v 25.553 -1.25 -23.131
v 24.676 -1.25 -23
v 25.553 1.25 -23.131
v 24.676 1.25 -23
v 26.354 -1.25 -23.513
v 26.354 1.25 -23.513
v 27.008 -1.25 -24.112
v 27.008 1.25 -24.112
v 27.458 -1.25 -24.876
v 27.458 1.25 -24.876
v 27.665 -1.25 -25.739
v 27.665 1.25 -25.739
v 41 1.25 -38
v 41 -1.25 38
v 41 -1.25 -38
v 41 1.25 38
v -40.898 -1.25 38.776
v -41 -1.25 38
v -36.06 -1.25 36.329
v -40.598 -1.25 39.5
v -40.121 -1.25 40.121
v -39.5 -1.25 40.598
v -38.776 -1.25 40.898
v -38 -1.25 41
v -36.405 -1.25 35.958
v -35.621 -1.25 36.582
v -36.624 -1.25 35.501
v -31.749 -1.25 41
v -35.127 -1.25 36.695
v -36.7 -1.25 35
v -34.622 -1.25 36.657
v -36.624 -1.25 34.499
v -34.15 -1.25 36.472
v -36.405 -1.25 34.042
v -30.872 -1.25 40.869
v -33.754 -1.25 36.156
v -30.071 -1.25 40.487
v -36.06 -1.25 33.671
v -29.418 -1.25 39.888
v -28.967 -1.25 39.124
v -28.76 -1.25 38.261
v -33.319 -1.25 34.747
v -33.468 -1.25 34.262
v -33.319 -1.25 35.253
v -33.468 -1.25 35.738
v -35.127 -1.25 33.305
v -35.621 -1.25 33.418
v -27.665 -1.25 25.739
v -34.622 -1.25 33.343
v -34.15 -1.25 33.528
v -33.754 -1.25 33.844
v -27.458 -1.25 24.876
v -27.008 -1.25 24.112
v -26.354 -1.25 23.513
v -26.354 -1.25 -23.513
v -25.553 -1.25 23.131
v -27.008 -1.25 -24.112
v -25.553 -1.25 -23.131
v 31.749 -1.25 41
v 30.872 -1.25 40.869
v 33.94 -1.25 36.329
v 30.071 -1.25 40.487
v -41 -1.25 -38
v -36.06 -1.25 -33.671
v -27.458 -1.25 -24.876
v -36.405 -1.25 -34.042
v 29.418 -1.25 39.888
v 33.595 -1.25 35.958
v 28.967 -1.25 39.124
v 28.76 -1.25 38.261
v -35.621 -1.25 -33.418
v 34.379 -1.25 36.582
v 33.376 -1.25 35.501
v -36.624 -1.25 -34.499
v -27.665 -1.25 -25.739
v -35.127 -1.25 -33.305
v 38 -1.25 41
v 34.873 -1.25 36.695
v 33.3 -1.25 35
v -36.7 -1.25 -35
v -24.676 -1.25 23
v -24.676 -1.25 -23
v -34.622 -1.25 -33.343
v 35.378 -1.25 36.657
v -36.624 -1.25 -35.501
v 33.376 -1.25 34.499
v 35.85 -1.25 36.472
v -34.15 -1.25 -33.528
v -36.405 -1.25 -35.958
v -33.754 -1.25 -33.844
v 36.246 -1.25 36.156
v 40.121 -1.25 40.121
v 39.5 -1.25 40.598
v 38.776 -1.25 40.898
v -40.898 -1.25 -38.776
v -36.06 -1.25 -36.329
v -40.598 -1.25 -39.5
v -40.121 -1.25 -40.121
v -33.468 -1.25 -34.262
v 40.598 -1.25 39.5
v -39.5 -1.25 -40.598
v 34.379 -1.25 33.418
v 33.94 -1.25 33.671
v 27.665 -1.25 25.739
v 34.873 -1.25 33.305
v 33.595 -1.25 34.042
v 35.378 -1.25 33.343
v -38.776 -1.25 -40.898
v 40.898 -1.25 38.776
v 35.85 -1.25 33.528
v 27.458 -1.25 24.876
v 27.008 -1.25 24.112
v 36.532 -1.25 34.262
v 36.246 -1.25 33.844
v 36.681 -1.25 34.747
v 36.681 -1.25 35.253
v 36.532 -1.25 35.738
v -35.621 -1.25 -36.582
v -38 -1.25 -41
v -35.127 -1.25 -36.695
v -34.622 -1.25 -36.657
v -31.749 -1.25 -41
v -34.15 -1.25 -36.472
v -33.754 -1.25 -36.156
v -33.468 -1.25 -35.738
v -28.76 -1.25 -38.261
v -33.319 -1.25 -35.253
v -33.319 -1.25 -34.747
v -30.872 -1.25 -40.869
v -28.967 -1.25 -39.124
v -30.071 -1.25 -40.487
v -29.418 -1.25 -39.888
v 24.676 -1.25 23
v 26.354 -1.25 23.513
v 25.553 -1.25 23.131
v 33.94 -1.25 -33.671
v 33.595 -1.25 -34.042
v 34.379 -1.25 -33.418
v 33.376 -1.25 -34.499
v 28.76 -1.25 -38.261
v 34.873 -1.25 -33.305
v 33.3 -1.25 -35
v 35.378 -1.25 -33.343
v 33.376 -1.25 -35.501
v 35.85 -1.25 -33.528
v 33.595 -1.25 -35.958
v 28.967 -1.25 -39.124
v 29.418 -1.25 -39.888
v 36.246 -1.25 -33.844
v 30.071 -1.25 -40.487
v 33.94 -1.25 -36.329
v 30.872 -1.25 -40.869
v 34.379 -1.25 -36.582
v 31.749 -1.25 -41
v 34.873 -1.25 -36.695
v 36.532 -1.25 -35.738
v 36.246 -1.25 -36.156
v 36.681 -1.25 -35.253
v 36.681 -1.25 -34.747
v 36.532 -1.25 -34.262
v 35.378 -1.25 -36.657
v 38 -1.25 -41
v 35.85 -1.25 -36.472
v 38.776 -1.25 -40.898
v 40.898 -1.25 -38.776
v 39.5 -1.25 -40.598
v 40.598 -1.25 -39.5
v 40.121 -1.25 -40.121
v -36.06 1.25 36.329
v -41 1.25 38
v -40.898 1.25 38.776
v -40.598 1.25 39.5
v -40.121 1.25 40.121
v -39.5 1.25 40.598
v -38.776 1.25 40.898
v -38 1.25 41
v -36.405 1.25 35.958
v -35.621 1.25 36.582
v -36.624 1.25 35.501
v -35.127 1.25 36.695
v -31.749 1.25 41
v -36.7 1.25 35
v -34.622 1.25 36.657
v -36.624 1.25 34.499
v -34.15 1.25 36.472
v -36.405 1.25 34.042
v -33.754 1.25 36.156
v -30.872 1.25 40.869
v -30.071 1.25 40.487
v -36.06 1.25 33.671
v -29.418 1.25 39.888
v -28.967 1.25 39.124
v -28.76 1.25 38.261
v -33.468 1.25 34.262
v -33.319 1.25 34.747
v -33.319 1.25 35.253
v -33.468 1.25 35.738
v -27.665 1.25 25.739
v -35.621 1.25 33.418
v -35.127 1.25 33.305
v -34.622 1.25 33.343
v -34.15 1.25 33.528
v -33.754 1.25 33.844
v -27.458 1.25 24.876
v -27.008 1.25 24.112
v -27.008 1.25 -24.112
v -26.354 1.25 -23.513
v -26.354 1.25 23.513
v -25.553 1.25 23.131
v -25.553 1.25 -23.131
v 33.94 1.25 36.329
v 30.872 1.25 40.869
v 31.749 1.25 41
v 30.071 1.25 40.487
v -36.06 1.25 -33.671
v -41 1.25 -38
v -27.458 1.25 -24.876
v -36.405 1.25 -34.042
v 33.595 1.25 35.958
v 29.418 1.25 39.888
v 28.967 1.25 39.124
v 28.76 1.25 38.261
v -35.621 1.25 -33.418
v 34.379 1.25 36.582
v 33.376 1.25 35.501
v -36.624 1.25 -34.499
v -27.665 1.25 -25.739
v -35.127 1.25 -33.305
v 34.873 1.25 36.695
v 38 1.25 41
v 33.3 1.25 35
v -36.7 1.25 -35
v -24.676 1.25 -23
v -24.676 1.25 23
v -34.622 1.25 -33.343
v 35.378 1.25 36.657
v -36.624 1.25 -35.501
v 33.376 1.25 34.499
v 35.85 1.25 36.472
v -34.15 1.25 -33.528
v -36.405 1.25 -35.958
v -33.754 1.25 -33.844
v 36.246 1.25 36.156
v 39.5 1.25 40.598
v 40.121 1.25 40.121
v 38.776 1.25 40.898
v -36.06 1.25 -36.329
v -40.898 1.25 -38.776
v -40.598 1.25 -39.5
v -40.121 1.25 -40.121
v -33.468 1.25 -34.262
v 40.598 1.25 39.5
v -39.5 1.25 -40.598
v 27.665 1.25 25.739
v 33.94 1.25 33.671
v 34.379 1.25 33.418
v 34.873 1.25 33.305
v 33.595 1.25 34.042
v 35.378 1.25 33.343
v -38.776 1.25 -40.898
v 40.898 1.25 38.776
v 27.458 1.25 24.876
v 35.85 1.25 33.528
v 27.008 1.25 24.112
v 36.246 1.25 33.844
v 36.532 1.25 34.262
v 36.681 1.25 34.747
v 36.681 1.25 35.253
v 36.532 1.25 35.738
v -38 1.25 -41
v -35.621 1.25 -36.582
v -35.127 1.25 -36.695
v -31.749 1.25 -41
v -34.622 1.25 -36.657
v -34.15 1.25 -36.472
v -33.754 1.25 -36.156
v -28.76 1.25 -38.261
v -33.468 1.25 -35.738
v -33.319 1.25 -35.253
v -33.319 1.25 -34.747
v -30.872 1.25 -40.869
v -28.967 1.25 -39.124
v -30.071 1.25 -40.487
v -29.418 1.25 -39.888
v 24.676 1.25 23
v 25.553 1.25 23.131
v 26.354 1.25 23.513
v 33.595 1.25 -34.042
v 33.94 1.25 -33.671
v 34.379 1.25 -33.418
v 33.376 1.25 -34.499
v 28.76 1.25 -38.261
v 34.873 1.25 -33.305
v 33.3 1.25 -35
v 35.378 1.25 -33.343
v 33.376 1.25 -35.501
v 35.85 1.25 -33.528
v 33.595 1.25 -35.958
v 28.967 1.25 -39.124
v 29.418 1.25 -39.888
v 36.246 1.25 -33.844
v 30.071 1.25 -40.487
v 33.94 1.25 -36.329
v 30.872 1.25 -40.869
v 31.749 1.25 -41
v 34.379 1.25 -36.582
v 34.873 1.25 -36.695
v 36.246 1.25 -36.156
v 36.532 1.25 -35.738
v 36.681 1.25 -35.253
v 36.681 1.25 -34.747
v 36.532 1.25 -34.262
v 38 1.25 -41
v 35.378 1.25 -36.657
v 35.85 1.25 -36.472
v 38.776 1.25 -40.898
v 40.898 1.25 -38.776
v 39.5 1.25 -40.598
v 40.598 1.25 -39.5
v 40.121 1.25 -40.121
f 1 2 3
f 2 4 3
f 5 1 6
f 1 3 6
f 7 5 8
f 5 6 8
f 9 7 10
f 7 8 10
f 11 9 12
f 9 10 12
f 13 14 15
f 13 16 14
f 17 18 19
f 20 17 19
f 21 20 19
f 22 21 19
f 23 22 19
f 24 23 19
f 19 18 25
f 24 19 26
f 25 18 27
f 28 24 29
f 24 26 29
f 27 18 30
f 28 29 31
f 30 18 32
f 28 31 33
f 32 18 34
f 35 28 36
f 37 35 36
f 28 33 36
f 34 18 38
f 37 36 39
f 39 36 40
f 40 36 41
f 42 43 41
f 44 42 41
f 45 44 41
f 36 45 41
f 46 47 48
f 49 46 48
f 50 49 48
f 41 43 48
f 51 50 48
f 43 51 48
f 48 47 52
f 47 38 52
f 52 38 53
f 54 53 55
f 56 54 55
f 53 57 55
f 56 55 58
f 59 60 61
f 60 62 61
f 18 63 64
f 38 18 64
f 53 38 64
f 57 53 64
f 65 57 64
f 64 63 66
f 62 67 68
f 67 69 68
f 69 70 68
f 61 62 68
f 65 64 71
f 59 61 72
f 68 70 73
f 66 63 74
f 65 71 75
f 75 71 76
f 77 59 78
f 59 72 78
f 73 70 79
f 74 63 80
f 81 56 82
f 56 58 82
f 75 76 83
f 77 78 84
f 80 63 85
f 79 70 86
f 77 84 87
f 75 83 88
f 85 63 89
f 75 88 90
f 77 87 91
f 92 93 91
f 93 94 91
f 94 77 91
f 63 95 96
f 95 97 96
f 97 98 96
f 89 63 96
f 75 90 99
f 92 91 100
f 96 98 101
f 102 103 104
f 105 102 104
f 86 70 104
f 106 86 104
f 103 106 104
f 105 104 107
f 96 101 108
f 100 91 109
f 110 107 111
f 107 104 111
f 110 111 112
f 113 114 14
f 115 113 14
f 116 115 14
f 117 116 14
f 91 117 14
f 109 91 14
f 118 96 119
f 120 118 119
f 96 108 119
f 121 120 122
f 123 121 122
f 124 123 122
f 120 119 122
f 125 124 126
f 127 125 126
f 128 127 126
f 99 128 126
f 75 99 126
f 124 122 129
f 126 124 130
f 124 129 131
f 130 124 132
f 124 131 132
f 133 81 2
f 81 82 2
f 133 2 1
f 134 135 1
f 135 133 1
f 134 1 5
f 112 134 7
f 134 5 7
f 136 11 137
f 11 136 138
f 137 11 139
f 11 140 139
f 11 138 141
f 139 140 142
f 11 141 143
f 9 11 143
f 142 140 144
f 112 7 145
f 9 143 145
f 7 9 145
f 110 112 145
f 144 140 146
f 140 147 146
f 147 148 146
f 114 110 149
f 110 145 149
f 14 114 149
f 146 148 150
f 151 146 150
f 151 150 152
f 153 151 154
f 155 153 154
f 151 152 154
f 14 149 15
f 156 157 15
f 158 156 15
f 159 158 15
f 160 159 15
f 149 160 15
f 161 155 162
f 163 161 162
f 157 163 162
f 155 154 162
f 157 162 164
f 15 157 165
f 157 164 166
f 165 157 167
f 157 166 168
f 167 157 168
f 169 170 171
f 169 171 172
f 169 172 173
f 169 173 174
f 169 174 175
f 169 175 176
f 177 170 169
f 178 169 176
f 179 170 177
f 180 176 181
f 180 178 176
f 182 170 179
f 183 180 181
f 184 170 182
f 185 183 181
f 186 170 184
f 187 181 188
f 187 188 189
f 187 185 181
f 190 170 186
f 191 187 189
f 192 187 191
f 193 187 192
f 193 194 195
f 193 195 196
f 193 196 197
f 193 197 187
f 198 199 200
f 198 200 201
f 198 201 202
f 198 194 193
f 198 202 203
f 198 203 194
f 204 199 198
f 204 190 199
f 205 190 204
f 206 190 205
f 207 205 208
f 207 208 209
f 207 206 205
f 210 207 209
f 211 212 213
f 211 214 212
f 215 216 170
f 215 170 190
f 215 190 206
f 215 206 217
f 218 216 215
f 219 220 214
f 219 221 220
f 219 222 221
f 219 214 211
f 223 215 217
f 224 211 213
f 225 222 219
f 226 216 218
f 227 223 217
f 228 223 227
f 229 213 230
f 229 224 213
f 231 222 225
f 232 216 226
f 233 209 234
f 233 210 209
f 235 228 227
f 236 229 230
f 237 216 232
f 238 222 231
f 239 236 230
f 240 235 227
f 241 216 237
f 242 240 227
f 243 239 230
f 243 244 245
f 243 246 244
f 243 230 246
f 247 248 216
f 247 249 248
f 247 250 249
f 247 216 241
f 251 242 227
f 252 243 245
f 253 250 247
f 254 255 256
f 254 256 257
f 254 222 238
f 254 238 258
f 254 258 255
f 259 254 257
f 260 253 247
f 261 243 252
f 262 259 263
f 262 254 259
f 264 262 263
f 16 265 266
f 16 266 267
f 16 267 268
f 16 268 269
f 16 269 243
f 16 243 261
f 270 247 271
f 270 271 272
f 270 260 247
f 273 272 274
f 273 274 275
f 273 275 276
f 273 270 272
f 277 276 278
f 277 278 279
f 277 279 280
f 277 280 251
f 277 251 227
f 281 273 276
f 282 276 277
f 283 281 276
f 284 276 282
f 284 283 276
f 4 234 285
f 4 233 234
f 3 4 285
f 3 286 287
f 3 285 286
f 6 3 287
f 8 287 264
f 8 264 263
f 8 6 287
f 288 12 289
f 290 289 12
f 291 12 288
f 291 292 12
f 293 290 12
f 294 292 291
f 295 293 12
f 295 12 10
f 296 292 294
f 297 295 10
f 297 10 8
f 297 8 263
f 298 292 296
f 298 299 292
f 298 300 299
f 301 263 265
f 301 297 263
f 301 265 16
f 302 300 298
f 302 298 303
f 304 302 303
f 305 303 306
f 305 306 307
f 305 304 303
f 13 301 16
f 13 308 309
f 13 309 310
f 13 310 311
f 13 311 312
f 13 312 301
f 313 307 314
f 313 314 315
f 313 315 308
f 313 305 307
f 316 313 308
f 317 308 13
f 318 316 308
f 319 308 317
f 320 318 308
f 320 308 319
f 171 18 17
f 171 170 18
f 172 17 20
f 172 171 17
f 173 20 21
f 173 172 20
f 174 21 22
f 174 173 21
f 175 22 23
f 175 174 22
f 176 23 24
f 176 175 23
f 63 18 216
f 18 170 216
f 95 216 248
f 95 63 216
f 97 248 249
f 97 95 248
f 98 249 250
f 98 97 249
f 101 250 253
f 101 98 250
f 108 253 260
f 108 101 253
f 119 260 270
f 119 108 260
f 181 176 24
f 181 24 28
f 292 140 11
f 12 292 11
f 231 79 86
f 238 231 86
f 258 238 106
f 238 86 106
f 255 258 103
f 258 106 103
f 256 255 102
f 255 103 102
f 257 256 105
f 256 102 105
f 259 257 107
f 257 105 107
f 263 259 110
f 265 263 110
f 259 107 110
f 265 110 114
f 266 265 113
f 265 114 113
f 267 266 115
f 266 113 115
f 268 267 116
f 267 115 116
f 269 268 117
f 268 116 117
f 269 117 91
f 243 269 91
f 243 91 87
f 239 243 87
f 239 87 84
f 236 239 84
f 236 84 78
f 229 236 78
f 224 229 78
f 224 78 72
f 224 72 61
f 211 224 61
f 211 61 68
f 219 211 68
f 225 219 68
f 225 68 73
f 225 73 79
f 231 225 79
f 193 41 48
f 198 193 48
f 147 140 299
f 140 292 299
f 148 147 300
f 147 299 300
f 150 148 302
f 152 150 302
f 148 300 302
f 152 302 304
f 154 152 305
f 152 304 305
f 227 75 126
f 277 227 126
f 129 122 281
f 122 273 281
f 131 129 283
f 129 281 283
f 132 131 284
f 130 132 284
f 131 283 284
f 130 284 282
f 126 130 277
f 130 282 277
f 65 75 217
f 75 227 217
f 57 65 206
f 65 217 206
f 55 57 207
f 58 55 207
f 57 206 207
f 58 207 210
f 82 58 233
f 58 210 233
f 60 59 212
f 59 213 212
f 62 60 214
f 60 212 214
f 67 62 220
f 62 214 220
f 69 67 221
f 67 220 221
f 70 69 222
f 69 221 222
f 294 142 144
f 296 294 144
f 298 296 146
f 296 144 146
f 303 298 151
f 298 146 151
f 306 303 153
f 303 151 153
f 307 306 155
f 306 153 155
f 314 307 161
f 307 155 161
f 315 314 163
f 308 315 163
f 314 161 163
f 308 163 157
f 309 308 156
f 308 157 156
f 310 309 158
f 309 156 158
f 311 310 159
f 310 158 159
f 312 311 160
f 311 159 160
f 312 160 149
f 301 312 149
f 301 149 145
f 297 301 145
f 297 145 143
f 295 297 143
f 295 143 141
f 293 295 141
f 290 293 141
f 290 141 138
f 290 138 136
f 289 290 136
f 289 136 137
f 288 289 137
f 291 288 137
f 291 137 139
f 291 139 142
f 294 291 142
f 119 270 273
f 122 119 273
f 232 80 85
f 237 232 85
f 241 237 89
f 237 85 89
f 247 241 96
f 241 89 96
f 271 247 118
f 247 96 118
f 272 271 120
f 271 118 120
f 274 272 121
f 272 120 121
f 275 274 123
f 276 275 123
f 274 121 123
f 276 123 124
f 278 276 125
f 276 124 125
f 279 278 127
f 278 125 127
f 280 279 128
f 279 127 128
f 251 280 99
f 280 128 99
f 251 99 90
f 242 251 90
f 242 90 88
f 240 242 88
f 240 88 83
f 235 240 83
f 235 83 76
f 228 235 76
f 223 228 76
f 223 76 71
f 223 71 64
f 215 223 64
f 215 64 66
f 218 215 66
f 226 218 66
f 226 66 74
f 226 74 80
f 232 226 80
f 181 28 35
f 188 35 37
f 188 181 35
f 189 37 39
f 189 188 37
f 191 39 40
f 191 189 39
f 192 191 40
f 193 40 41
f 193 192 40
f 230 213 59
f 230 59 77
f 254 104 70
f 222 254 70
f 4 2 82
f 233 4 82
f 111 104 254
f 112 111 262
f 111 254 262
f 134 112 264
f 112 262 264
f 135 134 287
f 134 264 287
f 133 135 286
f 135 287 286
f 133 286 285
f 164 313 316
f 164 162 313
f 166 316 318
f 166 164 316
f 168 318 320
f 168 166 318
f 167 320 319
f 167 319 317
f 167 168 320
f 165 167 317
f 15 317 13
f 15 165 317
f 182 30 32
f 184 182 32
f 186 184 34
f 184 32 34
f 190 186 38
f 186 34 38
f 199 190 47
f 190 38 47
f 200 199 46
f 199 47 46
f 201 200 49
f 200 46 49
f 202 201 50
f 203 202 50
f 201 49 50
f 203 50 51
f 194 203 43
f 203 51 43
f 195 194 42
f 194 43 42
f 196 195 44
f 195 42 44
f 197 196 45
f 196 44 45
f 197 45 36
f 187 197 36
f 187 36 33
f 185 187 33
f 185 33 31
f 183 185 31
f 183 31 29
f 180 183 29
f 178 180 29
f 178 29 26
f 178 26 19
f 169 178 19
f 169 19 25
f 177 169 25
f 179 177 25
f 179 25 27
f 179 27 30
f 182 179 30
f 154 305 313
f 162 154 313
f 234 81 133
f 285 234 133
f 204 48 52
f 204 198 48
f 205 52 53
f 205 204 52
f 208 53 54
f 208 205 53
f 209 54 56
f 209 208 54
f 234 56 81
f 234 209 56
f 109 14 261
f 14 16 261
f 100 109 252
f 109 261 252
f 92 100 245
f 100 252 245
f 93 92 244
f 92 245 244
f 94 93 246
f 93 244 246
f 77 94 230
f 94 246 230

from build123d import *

# Parameters (mm, degrees)
SKETCH1_W            = 82
SKETCH1_H            = 82
BOSS_EXTRUDE1_DEPTH  = 1.25
M3_CLEARANCE_HOLE1_D = 3.4
CUT_EXTRUDE1_DEPTH   = 59.036626366
FILLET1_R            = 3


with BuildPart() as part:
    # Sketch1 → Boss-Extrude1 (new, symmetric)
    with BuildSketch(Plane(origin=(0, 0, 0), x_dir=(1, 0, 0), z_dir=(0, 1, 0))):
        Rectangle(SKETCH1_W, SKETCH1_H)
    extrude(amount=BOSS_EXTRUDE1_DEPTH, both=True)

    # M3 Clearance Hole1 (through all)
    with Locations(Plane(origin=(0, 1.25, 0), x_dir=(1, 0, 0), z_dir=(0, 1, 0))):
        with Locations((35, 35), (-35, -35), (-35, 35), (35, -35)):
            Hole(M3_CLEARANCE_HOLE1_D / 2)

    # Sketch4 → Cut-Extrude1 (cut, through all)
    with BuildSketch(Plane(origin=(0, -1.25, 0), x_dir=(-1, 0, 0), z_dir=(0, -1, 0))):
        Polygon((-29, -41), (29, -41), (27.425204057, -23), (-27.425204057, -23), align=None)
        Polygon((29, 41), (-29, 41), (-27.425204057, 23), (0, 23), (27.425204057, 23), align=None)
    extrude(amount=-CUT_EXTRUDE1_DEPTH, mode=Mode.SUBTRACT)

    # Fillet1
    fillet1_edges = [part.edges().sort_by_distance(p)[0] for p in [
        (29, 0, 41),
        (27.425204057, 0, 23),
        (-27.425204057, 0, 23),
        (-29, 0, 41),
        (-29, 0, -41),
        (-27.425204057, 0, -23),
        (27.425204057, 0, -23),
        (29, 0, -41),
        (-41, 0, -41),
        (41, 0, -41),
        (41, 0, 41),
        (-41, 0, 41),
    ]]
    fillet(fillet1_edges, radius=FILLET1_R)


solid = part.part
